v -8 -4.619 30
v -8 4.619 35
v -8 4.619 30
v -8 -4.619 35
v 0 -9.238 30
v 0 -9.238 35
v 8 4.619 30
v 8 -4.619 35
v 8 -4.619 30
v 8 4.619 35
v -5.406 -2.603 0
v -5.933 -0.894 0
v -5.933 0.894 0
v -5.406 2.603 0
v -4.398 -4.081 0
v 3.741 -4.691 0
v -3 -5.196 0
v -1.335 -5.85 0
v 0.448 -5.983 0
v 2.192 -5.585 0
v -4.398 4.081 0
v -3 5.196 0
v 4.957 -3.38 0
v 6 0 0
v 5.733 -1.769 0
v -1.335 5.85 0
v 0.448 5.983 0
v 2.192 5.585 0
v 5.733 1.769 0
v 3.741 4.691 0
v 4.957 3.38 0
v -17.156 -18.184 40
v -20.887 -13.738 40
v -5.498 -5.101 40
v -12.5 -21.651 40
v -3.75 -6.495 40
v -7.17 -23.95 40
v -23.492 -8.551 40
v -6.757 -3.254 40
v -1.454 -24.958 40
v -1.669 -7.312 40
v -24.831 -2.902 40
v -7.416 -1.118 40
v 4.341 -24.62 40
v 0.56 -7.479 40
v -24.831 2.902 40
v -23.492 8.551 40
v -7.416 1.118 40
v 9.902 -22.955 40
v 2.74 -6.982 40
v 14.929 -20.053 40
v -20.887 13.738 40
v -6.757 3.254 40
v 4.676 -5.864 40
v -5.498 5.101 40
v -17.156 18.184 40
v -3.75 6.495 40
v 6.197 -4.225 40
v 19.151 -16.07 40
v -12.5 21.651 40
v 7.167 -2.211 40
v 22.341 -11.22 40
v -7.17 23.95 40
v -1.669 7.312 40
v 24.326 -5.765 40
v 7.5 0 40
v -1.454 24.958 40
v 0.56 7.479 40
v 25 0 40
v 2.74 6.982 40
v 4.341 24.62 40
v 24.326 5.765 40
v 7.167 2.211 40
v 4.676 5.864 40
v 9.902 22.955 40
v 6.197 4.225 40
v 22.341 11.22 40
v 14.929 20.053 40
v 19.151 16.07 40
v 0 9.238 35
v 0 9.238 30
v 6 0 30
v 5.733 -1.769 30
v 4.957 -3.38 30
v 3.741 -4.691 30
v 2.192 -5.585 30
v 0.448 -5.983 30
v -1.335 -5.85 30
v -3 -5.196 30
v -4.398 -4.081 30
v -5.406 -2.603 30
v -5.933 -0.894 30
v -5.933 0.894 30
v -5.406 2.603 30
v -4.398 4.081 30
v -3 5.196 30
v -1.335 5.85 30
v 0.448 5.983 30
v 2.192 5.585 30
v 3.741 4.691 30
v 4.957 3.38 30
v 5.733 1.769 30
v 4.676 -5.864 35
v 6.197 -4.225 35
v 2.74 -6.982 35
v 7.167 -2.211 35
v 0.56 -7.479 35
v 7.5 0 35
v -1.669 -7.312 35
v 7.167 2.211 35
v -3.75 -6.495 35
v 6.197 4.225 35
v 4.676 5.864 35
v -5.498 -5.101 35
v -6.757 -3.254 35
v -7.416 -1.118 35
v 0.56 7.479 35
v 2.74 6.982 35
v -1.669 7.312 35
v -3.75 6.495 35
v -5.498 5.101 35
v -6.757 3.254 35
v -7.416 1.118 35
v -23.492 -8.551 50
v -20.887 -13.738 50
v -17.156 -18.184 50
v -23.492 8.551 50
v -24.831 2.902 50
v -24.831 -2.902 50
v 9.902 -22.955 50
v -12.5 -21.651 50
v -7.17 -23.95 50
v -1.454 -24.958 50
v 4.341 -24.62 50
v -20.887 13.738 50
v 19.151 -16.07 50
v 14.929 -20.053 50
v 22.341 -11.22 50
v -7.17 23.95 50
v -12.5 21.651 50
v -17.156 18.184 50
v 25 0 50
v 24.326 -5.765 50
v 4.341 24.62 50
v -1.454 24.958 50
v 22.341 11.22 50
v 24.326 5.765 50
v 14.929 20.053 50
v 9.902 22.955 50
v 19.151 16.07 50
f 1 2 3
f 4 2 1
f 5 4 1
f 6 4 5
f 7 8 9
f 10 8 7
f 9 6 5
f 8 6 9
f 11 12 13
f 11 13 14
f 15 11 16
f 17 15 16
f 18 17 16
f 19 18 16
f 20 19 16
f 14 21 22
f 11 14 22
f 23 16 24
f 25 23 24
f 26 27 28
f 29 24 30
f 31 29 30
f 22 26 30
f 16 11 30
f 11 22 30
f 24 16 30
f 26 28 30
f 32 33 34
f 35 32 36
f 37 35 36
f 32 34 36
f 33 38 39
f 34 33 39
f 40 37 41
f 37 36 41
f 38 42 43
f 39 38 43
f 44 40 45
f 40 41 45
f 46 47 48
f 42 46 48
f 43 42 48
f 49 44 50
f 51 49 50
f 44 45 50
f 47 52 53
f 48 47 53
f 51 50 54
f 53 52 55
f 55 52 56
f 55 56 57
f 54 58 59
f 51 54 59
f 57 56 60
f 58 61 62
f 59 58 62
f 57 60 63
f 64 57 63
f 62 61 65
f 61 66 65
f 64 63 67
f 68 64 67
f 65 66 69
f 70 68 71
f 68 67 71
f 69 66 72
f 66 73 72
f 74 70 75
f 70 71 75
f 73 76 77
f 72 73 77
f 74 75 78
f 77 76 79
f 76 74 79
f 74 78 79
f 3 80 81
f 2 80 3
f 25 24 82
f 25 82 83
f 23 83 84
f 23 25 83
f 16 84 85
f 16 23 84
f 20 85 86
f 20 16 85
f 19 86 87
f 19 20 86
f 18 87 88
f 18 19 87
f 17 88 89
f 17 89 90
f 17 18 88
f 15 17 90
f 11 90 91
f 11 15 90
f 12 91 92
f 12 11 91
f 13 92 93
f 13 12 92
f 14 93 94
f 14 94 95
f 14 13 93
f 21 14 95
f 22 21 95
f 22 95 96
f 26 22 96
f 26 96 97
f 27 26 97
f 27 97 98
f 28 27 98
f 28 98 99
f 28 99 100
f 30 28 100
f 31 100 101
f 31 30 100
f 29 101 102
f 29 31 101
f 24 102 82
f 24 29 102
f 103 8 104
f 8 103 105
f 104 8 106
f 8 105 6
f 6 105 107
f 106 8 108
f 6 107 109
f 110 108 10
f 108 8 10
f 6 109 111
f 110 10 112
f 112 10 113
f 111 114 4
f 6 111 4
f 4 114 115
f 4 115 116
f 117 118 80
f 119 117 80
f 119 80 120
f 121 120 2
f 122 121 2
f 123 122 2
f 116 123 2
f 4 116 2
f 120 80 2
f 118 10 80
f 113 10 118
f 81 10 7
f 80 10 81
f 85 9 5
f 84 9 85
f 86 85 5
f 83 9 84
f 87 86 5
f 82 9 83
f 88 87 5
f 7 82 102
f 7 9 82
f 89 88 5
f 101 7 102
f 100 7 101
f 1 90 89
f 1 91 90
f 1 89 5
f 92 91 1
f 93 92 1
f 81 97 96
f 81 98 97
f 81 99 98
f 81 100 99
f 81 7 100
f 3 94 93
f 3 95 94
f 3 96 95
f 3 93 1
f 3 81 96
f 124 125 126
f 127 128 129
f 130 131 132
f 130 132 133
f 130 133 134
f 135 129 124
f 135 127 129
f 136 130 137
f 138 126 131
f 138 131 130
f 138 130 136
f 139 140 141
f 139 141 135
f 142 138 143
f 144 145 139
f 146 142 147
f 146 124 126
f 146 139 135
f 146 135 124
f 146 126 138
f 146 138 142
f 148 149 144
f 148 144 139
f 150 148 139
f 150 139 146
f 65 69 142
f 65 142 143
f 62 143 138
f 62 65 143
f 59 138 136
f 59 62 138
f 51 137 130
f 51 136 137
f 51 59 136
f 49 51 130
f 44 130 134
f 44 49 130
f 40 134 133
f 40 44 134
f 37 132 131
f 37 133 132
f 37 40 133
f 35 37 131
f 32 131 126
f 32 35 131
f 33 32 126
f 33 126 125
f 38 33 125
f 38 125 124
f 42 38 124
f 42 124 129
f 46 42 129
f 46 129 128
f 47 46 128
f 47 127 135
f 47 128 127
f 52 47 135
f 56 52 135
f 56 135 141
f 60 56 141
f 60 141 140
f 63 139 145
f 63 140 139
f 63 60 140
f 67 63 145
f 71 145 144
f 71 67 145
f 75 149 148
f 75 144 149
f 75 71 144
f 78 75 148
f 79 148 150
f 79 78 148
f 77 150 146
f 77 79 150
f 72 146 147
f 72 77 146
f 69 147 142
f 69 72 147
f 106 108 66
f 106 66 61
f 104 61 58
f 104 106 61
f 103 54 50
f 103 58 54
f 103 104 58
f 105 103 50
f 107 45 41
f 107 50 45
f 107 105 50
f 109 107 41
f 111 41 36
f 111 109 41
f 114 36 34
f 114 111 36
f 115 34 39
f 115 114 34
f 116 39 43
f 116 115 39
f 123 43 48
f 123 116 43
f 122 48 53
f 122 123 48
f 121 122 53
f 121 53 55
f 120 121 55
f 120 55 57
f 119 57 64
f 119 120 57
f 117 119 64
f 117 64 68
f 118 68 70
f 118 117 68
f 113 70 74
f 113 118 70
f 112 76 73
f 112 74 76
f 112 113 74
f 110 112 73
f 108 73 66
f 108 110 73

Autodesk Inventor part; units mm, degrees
ref_plane "YZ Plane" through (0, 0, 0) normal (1, 0, 0) x (0, 1, 0)
ref_plane "XZ Plane" through (0, 0, 0) normal (0, 1, 0) x (-1, 0, 0)
ref_plane "XY Plane" through (0, 0, 0) normal (0, 0, 1) x (1, 0, 0)
sketch "Sketch1" plane through (0, 0, 0) normal (0, 0, 1) x (1, 0, 0)
  circle A0 centre (0, 0) radius 6
  dimension "d0" = 12
extrude "Extrusion1" add sketch "Sketch1" along normal blind 35
thread "Thread1" size "M12x1.75" class "6g" standard "ANSI Metric M Profile" full length
sketch "Sketch2" plane through (0, 0, 35) normal (0, 0, 1) x (1, 0, 0)
  circle A0 centre (0, 0) radius 7.5
  dimension "d5" = 15
extrude "Extrusion2" add sketch "Sketch2" along normal blind 5
sketch "Sketch3" plane through (0, 0, 40) normal (0, 0, 1) x (1, 0, 0)
  circle A0 centre (0, 0) radius 25
  dimension "d8" = 50
extrude "Extrusion3" add sketch "Sketch3" along normal blind 10
sketch "Sketch4" plane through (0, 0, 35) normal (0, 0, -1) x (-1, 0, 0)
  line L0 (0, 6.9282) -> (6, 3.4641)
  line L1 (6, 3.4641) -> (6, -3.4641)
  line L2 (6, -3.4641) -> (0, -6.9282)
  line L3 (0, -6.9282) -> (-6, -3.4641)
  line L4 (-6, -3.4641) -> (-6, 3.4641)
  line L5 (-6, 3.4641) -> (0, 6.9282)
  line L6 (0, 9.2376) -> (8, 4.6188)
  line L7 (8, 4.6188) -> (8, -4.6188)
  line L8 (8, -4.6188) -> (0, -9.2376)
  line L9 (0, -9.2376) -> (-8, -4.6188)
  line L10 (-8, -4.6188) -> (-8, 4.6188)
  line L11 (-8, 4.6188) -> (0, 9.2376)
  point P0 (0, 0)
  point P1 (0, 0)
  point P2 (0, 0)
  dimension "d11" = 6
  dimension "d12" = 8
extrude "Extrusion4" add sketch "Sketch4" along normal blind 5 contours L0 L1 L2 L3 L4 L5 | L6 L7 L8 L9 L10 L11
properties part number "ChanBangTai"
